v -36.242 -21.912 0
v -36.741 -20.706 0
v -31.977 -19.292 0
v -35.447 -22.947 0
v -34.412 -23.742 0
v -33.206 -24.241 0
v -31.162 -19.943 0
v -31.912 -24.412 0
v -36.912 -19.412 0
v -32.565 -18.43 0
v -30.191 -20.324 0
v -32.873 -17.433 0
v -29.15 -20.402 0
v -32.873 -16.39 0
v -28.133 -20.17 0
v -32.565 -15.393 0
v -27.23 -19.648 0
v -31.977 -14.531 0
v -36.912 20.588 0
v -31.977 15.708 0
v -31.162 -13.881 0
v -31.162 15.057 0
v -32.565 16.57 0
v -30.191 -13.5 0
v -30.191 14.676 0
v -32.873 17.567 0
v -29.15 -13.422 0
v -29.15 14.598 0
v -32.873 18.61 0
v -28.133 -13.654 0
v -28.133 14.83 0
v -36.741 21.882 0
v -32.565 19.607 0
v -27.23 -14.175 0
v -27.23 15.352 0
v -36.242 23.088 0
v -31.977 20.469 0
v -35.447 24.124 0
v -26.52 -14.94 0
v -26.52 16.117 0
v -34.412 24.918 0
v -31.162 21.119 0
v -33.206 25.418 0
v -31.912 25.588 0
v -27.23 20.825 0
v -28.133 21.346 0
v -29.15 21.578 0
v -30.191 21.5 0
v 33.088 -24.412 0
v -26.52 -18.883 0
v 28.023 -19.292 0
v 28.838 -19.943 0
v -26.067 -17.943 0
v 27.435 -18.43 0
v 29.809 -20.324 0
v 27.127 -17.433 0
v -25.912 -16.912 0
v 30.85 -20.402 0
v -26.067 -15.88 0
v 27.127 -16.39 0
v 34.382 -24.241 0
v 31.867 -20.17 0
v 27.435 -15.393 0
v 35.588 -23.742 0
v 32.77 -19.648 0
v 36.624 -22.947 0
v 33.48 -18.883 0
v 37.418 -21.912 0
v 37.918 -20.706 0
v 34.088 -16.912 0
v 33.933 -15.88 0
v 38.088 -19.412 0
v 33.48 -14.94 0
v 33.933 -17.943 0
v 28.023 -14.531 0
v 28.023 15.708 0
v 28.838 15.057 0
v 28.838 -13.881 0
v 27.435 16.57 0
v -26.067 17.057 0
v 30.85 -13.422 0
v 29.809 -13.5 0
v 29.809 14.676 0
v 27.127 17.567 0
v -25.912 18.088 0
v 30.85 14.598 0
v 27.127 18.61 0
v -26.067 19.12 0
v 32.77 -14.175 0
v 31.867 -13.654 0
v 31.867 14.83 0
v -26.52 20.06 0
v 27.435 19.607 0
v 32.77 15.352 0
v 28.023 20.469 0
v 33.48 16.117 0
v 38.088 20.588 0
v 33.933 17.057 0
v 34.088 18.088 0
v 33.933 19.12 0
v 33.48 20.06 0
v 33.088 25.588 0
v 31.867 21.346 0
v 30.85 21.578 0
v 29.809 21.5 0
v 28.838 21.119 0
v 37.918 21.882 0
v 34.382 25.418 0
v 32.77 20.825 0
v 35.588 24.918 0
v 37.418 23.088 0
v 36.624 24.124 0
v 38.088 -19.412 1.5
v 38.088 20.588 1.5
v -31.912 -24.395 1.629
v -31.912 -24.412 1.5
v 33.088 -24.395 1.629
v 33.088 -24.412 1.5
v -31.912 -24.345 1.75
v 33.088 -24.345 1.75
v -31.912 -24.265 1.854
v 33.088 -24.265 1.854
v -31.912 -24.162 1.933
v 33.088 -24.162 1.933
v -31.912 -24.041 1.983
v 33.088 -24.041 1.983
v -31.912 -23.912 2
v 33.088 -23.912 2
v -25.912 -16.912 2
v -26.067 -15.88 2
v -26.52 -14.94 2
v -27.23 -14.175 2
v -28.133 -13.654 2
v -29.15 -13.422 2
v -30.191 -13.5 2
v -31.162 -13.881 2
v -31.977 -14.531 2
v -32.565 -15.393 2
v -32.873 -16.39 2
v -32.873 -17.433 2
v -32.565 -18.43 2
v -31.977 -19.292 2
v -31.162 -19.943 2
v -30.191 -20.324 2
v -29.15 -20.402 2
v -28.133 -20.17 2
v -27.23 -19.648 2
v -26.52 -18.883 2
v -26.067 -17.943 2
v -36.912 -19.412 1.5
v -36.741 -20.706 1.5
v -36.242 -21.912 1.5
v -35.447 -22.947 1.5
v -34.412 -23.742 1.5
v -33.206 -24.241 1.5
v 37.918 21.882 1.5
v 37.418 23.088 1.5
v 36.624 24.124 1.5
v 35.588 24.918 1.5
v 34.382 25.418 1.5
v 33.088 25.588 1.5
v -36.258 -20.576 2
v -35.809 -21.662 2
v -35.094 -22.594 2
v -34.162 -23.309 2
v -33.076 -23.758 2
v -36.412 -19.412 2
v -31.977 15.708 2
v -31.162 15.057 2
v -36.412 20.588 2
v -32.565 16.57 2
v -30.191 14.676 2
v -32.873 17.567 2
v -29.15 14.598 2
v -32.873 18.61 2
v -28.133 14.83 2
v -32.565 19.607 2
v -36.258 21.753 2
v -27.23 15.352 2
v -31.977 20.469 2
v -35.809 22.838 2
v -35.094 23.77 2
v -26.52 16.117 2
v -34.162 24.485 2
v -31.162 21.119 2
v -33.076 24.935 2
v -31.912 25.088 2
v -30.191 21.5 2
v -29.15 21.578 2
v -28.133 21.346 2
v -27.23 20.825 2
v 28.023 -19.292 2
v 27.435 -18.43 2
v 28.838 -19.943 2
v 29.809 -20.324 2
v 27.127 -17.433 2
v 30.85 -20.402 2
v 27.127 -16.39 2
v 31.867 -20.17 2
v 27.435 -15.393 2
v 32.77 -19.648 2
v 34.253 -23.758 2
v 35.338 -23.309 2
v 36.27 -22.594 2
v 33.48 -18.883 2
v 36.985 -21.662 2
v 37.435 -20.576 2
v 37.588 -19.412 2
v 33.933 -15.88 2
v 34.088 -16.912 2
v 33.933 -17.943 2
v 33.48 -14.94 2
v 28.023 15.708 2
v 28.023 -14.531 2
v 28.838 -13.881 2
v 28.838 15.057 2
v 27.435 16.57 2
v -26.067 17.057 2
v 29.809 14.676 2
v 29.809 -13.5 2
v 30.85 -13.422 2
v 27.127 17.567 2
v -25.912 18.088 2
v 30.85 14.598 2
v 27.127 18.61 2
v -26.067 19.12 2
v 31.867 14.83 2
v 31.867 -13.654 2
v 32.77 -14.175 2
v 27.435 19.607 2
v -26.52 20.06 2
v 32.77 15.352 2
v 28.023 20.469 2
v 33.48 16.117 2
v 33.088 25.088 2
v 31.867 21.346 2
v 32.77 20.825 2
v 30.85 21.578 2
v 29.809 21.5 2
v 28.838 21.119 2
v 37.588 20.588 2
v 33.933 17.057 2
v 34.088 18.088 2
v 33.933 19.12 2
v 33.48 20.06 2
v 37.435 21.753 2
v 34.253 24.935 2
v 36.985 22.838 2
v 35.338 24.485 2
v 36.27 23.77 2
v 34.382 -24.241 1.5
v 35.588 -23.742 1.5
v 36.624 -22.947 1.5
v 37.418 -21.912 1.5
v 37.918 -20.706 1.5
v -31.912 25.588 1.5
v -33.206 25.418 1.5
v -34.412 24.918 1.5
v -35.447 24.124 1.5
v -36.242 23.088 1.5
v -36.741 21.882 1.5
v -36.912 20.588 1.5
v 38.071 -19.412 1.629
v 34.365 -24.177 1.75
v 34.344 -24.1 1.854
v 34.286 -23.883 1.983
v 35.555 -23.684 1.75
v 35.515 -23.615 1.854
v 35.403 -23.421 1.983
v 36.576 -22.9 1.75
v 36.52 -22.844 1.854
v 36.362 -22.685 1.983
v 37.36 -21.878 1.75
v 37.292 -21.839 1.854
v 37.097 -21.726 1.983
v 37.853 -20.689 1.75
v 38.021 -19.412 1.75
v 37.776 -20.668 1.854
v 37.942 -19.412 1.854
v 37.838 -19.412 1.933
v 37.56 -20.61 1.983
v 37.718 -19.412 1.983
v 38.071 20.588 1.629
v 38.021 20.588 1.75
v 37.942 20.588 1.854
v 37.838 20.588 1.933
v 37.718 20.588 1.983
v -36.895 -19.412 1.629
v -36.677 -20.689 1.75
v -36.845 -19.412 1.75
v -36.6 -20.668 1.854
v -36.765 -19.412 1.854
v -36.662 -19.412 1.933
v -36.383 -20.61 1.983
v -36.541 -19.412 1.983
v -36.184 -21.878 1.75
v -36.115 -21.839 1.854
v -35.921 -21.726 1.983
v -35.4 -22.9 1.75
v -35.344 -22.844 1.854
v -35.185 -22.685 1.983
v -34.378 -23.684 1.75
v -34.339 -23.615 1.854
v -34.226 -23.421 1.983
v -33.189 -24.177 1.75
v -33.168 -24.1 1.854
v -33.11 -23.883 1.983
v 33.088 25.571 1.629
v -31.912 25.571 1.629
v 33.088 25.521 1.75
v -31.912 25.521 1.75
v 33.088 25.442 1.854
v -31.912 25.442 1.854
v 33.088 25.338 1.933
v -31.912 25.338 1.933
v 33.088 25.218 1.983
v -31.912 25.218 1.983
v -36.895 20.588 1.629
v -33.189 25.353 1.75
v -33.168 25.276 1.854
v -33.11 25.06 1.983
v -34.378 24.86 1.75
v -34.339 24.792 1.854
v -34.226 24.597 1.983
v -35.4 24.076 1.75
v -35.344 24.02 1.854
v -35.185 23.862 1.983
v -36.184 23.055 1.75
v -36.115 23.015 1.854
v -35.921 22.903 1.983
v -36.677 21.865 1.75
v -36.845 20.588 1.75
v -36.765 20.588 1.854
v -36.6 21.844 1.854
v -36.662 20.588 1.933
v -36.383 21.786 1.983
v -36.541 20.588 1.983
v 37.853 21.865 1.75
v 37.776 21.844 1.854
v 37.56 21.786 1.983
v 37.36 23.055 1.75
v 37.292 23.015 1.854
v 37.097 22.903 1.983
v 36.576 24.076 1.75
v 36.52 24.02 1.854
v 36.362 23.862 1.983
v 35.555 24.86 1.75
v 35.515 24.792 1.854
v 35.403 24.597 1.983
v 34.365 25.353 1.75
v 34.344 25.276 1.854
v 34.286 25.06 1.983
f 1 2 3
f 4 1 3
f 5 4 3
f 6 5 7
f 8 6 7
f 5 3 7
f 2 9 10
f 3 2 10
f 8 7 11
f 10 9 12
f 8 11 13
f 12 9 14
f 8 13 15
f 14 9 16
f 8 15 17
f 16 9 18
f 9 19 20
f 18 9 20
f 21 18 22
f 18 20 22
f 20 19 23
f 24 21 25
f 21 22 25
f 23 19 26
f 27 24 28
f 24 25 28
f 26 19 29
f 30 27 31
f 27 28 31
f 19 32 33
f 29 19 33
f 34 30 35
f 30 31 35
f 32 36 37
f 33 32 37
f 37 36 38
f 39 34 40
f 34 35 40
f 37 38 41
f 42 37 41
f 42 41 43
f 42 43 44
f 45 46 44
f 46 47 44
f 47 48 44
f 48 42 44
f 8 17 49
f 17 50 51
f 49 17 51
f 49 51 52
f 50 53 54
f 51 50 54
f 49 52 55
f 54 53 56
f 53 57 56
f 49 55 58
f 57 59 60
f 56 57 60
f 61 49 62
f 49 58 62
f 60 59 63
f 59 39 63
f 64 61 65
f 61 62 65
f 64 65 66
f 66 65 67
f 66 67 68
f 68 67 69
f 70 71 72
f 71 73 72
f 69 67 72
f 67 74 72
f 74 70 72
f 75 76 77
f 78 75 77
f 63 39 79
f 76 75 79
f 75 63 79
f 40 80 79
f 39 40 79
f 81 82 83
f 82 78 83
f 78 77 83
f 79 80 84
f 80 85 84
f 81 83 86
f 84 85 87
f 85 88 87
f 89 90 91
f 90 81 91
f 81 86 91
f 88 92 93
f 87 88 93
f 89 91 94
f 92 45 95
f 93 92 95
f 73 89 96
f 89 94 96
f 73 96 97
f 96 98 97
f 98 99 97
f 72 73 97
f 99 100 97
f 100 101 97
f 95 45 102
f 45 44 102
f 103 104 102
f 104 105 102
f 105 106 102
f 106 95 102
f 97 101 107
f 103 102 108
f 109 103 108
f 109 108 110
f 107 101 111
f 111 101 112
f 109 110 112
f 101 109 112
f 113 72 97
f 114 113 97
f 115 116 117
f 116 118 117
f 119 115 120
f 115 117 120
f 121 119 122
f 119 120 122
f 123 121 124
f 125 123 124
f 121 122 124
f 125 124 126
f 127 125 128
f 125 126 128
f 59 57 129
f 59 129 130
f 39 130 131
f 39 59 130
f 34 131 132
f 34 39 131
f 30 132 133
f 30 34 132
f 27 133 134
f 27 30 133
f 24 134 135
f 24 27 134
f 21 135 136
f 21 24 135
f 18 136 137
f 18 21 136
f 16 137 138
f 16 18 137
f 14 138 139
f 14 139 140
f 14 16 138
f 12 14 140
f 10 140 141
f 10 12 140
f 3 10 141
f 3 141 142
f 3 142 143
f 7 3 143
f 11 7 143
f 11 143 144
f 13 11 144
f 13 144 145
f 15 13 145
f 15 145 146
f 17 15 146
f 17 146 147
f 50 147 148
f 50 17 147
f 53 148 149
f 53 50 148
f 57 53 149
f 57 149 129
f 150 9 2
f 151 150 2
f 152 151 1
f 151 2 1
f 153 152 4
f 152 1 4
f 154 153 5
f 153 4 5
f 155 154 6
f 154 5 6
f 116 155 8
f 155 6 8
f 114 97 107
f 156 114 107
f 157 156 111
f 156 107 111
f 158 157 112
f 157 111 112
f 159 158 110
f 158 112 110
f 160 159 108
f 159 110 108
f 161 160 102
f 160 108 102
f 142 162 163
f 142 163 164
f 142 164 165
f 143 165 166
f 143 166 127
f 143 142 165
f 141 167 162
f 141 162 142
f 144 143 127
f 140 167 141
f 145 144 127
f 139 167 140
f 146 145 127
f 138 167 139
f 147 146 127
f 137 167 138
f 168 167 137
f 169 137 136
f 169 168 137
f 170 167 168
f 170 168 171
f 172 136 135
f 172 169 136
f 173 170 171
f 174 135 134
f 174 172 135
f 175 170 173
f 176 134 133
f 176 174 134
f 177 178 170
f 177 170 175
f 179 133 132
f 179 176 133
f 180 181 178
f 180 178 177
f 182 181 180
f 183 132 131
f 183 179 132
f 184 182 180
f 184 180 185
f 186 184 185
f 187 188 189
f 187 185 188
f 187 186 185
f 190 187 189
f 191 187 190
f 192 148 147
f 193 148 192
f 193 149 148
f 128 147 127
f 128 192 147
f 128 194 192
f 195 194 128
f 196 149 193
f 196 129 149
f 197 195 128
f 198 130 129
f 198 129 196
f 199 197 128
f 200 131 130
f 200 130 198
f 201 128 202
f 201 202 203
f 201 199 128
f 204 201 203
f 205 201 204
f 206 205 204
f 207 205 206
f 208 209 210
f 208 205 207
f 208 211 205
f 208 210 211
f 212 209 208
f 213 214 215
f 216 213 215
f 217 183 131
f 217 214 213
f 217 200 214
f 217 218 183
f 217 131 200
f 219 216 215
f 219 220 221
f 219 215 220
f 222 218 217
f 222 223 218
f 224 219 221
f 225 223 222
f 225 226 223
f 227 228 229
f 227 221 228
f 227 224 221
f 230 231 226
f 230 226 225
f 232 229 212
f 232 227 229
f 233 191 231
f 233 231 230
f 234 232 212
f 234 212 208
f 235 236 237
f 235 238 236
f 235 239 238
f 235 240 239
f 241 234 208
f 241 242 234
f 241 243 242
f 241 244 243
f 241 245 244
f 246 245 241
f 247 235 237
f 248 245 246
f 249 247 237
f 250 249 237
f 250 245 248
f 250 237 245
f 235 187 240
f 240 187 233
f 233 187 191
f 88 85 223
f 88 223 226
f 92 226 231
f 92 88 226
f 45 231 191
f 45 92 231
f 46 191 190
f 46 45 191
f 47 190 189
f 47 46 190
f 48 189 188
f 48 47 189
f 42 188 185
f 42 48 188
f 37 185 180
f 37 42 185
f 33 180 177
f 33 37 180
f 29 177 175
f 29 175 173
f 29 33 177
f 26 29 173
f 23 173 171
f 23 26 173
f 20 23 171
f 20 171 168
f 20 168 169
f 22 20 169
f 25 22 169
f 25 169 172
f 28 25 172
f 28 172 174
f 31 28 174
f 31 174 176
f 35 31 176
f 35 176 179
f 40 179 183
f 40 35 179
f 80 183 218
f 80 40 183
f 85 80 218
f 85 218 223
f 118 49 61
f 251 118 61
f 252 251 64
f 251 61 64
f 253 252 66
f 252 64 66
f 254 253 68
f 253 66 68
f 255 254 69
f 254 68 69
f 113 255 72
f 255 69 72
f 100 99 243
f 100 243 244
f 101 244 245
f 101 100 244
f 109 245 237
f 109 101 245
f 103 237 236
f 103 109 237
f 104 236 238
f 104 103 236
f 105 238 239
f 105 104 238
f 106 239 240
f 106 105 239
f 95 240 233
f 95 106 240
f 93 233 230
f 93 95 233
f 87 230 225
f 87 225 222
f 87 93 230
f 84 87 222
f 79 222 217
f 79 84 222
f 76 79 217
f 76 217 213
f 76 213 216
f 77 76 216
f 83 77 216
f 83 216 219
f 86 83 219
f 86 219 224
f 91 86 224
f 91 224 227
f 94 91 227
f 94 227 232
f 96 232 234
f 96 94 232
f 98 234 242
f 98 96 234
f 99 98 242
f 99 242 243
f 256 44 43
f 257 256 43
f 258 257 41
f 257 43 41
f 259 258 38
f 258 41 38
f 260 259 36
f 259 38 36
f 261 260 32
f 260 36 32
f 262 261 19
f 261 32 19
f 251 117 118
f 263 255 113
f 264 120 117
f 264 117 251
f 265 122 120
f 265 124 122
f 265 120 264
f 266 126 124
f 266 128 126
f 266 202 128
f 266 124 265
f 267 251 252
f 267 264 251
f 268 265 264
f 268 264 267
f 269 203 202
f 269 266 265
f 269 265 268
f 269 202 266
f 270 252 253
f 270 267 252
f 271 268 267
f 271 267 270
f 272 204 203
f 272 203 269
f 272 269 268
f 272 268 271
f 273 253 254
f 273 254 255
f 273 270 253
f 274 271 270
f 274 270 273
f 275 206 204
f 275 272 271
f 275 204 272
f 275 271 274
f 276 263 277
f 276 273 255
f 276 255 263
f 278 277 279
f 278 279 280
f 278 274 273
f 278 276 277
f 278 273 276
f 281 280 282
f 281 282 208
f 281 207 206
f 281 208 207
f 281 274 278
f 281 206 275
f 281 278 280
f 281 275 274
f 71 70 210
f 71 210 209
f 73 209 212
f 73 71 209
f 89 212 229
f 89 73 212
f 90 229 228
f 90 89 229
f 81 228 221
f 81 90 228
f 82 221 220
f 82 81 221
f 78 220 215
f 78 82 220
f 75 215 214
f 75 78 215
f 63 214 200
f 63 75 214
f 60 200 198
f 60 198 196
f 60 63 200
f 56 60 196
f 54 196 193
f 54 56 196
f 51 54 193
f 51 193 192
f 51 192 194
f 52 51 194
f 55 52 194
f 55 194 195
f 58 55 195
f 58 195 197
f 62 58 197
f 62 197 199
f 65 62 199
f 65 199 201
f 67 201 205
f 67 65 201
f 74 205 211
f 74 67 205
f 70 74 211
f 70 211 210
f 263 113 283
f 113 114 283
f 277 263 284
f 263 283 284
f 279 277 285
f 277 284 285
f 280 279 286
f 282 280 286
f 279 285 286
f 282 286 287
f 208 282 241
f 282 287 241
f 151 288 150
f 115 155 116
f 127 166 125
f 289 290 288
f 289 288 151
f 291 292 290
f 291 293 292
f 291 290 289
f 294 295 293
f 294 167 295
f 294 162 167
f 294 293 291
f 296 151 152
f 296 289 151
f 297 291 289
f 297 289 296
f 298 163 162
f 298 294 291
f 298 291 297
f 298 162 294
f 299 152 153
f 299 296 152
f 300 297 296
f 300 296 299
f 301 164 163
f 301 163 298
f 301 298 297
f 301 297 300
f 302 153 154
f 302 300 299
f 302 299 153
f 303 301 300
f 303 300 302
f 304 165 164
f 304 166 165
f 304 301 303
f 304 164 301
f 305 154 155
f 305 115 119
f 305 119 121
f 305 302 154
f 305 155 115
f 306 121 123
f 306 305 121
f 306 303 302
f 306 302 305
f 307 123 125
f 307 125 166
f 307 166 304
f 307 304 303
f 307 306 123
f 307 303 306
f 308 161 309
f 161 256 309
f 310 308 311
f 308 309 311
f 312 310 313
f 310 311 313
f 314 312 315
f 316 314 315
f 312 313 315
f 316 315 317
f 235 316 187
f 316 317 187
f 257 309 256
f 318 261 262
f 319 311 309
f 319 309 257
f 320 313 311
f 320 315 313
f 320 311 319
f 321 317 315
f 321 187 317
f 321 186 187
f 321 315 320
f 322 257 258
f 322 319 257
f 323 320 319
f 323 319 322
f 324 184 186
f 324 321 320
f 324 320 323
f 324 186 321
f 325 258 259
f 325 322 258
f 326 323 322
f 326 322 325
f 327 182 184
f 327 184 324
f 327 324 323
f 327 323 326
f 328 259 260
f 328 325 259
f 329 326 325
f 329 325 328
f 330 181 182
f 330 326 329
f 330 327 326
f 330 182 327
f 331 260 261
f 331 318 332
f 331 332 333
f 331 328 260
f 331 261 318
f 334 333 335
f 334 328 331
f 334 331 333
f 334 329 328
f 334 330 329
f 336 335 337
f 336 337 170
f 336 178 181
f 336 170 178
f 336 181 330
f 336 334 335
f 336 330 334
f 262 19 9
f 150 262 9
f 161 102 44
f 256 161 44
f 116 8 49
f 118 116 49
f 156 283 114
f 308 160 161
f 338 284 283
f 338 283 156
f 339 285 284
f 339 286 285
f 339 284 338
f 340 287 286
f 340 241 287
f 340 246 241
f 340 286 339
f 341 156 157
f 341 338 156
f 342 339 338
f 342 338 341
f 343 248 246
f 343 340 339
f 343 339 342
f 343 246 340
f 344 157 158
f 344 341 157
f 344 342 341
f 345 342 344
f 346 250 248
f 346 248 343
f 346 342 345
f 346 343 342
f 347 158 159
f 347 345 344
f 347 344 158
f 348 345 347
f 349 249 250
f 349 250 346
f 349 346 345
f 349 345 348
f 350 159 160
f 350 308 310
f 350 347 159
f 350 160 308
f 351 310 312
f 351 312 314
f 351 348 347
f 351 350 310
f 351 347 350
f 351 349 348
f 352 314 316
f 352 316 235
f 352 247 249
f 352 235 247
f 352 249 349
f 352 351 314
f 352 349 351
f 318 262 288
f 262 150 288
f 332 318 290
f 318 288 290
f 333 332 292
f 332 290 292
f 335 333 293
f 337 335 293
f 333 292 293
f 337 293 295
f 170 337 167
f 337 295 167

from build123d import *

# Parameters (mm, degrees)
F0_R     = 3.5
F1_DEPTH = 2
F2_R     = 0.5


with BuildPart() as f1:
    # F0 (on Top) → F1 (new body)
    with BuildSketch(Plane.XY):
        with BuildLine():
            ThreePointArc((38.0882352941, 20.5882352941), (36.6237692001, 24.1237692001), (33.0882352941, 25.5882352941))
            Line((33.0882352941, 25.5882352941), (-31.9117647059, 25.5882352941))
            ThreePointArc((-31.9117647059, 25.5882352941), (-35.4472986118, 24.1237692001), (-36.9117647059, 20.5882352941))
            Line((-36.9117647059, 20.5882352941), (-36.9117647059, -19.4117647059))
            ThreePointArc((-36.9117647059, -19.4117647059), (-35.4472986118, -22.9472986118), (-31.9117647059, -24.4117647059))
            Line((-31.9117647059, -24.4117647059), (33.0882352941, -24.4117647059))
            ThreePointArc((33.0882352941, -24.4117647059), (36.6237692001, -22.9472986118), (38.0882352941, -19.4117647059))
            Line((38.0882352941, -19.4117647059), (38.0882352941, 20.5882352941))
        make_face()
        with BuildLine():
            ThreePointArc((33.0882352941, 24.5882352941), (35.9166624189, 23.4166624189), (37.0882352941, 20.5882352941))
            Line((37.0882352941, 20.5882352941), (37.0882352941, -19.4117647059))
            ThreePointArc((37.0882352941, -19.4117647059), (35.9166624189, -22.2401918306), (33.0882352941, -23.4117647059))
            Line((33.0882352941, -23.4117647059), (-31.9117647059, -23.4117647059))
            ThreePointArc((-31.9117647059, -23.4117647059), (-34.7401918306, -22.2401918306), (-35.9117647059, -19.4117647059))
            Line((-35.9117647059, -19.4117647059), (-35.9117647059, 20.5882352941))
            ThreePointArc((-35.9117647059, 20.5882352941), (-34.7401918306, 23.4166624189), (-31.9117647059, 24.5882352941))
            Line((-31.9117647059, 24.5882352941), (33.0882352941, 24.5882352941))
        make_face(mode=Mode.SUBTRACT)
        with BuildLine():
            Line((37.0882352941, -19.4117647059), (37.0882352941, 20.5882352941))
            ThreePointArc((37.0882352941, 20.5882352941), (35.9166624189, 23.4166624189), (33.0882352941, 24.5882352941))
            Line((33.0882352941, 24.5882352941), (-31.9117647059, 24.5882352941))
            ThreePointArc((-31.9117647059, 24.5882352941), (-34.7401918306, 23.4166624189), (-35.9117647059, 20.5882352941))
            Line((-35.9117647059, 20.5882352941), (-35.9117647059, -19.4117647059))
            ThreePointArc((-35.9117647059, -19.4117647059), (-34.7401918306, -22.2401918306), (-31.9117647059, -23.4117647059))
            Line((-31.9117647059, -23.4117647059), (33.0882352941, -23.4117647059))
            ThreePointArc((33.0882352941, -23.4117647059), (35.9166624189, -22.2401918306), (37.0882352941, -19.4117647059))
        make_face()
        with BuildLine():
            ThreePointArc((33.0882352941, 23.0882352941), (34.8560022471, 22.3560022471), (35.5882352941, 20.5882352941))
            Line((35.5882352941, 20.5882352941), (35.5882352941, -19.4117647059))
            ThreePointArc((35.5882352941, -19.4117647059), (34.8560022471, -21.1795316588), (33.0882352941, -21.9117647059))
            Line((33.0882352941, -21.9117647059), (-31.9117647059, -21.9117647059))
            ThreePointArc((-31.9117647059, -21.9117647059), (-33.6795316588, -21.1795316588), (-34.4117647059, -19.4117647059))
            Line((-34.4117647059, -19.4117647059), (-34.4117647059, 20.5882352941))
            ThreePointArc((-34.4117647059, 20.5882352941), (-33.6795316588, 22.3560022471), (-31.9117647059, 23.0882352941))
            Line((-31.9117647059, 23.0882352941), (33.0882352941, 23.0882352941))
        make_face(mode=Mode.SUBTRACT)
        with BuildLine():
            Line((35.5882352941, -19.4117647059), (35.5882352941, 20.5882352941))
            ThreePointArc((35.5882352941, 20.5882352941), (34.8560022471, 22.3560022471), (33.0882352941, 23.0882352941))
            Line((33.0882352941, 23.0882352941), (-31.9117647059, 23.0882352941))
            ThreePointArc((-31.9117647059, 23.0882352941), (-33.6795316588, 22.3560022471), (-34.4117647059, 20.5882352941))
            Line((-34.4117647059, 20.5882352941), (-34.4117647059, -19.4117647059))
            ThreePointArc((-34.4117647059, -19.4117647059), (-33.6795316588, -21.1795316588), (-31.9117647059, -21.9117647059))
            Line((-31.9117647059, -21.9117647059), (33.0882352941, -21.9117647059))
            ThreePointArc((33.0882352941, -21.9117647059), (34.8560022471, -21.1795316588), (35.5882352941, -19.4117647059))
        make_face()
        with BuildLine():
            ThreePointArc((33.0882352941, 22.0882352941), (34.1488954659, 21.6488954659), (34.5882352941, 20.5882352941))
            Line((34.5882352941, 20.5882352941), (34.5882352941, 14.3133180765))
            Line((34.5882352941, 14.3133180765), (34.5882352941, -13.1368474882))
            Line((34.5882352941, -13.1368474882), (34.5882352941, -19.4117647059))
            ThreePointArc((34.5882352941, -19.4117647059), (34.1488954659, -20.4724248777), (33.0882352941, -20.9117647059))
            Line((33.0882352941, -20.9117647059), (26.8133180765, -20.9117647059))
            Line((26.8133180765, -20.9117647059), (-25.6368474882, -20.9117647059))
            Line((-25.6368474882, -20.9117647059), (-31.9117647059, -20.9117647059))
            ThreePointArc((-31.9117647059, -20.9117647059), (-32.9724248777, -20.4724248777), (-33.4117647059, -19.4117647059))
            Line((-33.4117647059, -19.4117647059), (-33.4117647059, -13.1368474882))
            Line((-33.4117647059, -13.1368474882), (-33.4117647059, 14.3133180765))
            Line((-33.4117647059, 14.3133180765), (-33.4117647059, 20.5882352941))
            ThreePointArc((-33.4117647059, 20.5882352941), (-32.9724248777, 21.6488954659), (-31.9117647059, 22.0882352941))
            Line((-31.9117647059, 22.0882352941), (-25.6368474882, 22.0882352941))
            Line((-25.6368474882, 22.0882352941), (26.8133180765, 22.0882352941))
            Line((26.8133180765, 22.0882352941), (33.0882352941, 22.0882352941))
        make_face(mode=Mode.SUBTRACT)
        with BuildLine():
            Line((34.5882352941, -13.1368474882), (34.5882352941, 14.3133180765))
            ThreePointArc((34.5882352941, 14.3133180765), (26.6991479976, 14.1991479976), (26.8133180765, 22.0882352941))
            Line((26.8133180765, 22.0882352941), (-25.6368474882, 22.0882352941))
            ThreePointArc((-25.6368474882, 22.0882352941), (-25.5226774094, 14.1991479976), (-33.4117647059, 14.3133180765))
            Line((-33.4117647059, 14.3133180765), (-33.4117647059, -13.1368474882))
            ThreePointArc((-33.4117647059, -13.1368474882), (-25.5226774094, -13.0226774094), (-25.6368474882, -20.9117647059))
            Line((-25.6368474882, -20.9117647059), (26.8133180765, -20.9117647059))
            ThreePointArc((26.8133180765, -20.9117647059), (26.6991479976, -13.0226774094), (34.5882352941, -13.1368474882))
        make_face()
        with BuildLine():
            ThreePointArc((-33.4117647059, 14.3133180765), (-25.5226774094, 14.1991479976), (-25.6368474882, 22.0882352941))
            Line((-25.6368474882, 22.0882352941), (-31.9117647059, 22.0882352941))
            ThreePointArc((-31.9117647059, 22.0882352941), (-32.9724248777, 21.6488954659), (-33.4117647059, 20.5882352941))
            Line((-33.4117647059, 20.5882352941), (-33.4117647059, 14.3133180765))
        make_face()
        with Locations((-29.4117647059, 18.0882352941)):
            Circle(F0_R, mode=Mode.SUBTRACT)
        with BuildLine():
            Line((-31.9117647059, -20.9117647059), (-25.6368474882, -20.9117647059))
            ThreePointArc((-25.6368474882, -20.9117647059), (-25.5226774094, -13.0226774094), (-33.4117647059, -13.1368474882))
            Line((-33.4117647059, -13.1368474882), (-33.4117647059, -19.4117647059))
            ThreePointArc((-33.4117647059, -19.4117647059), (-32.9724248777, -20.4724248777), (-31.9117647059, -20.9117647059))
        make_face()
        with Locations((-29.4117647059, -16.9117647059)):
            Circle(F0_R, mode=Mode.SUBTRACT)
        with BuildLine():
            Line((34.5882352941, 14.3133180765), (34.5882352941, 20.5882352941))
            ThreePointArc((34.5882352941, 20.5882352941), (34.1488954659, 21.6488954659), (33.0882352941, 22.0882352941))
            Line((33.0882352941, 22.0882352941), (26.8133180765, 22.0882352941))
            ThreePointArc((26.8133180765, 22.0882352941), (26.6991479976, 14.1991479976), (34.5882352941, 14.3133180765))
        make_face()
        with Locations((30.5882352941, 18.0882352941)):
            Circle(F0_R, mode=Mode.SUBTRACT)
        with BuildLine():
            Line((34.5882352941, -19.4117647059), (34.5882352941, -13.1368474882))
            ThreePointArc((34.5882352941, -13.1368474882), (26.6991479976, -13.0226774094), (26.8133180765, -20.9117647059))
            Line((26.8133180765, -20.9117647059), (33.0882352941, -20.9117647059))
            ThreePointArc((33.0882352941, -20.9117647059), (34.1488954659, -20.4724248777), (34.5882352941, -19.4117647059))
        make_face()
        with Locations((30.5882352941, -16.9117647059)):
            Circle(F0_R, mode=Mode.SUBTRACT)
    extrude(amount=F1_DEPTH)

    # F2
    f2_edges = [f1.edges().sort_by_distance(p)[0] for p in [
        (-36.911765, 0.588235, 2),
    ]]
    fillet(f2_edges, radius=F2_R)


solid = f1.part
